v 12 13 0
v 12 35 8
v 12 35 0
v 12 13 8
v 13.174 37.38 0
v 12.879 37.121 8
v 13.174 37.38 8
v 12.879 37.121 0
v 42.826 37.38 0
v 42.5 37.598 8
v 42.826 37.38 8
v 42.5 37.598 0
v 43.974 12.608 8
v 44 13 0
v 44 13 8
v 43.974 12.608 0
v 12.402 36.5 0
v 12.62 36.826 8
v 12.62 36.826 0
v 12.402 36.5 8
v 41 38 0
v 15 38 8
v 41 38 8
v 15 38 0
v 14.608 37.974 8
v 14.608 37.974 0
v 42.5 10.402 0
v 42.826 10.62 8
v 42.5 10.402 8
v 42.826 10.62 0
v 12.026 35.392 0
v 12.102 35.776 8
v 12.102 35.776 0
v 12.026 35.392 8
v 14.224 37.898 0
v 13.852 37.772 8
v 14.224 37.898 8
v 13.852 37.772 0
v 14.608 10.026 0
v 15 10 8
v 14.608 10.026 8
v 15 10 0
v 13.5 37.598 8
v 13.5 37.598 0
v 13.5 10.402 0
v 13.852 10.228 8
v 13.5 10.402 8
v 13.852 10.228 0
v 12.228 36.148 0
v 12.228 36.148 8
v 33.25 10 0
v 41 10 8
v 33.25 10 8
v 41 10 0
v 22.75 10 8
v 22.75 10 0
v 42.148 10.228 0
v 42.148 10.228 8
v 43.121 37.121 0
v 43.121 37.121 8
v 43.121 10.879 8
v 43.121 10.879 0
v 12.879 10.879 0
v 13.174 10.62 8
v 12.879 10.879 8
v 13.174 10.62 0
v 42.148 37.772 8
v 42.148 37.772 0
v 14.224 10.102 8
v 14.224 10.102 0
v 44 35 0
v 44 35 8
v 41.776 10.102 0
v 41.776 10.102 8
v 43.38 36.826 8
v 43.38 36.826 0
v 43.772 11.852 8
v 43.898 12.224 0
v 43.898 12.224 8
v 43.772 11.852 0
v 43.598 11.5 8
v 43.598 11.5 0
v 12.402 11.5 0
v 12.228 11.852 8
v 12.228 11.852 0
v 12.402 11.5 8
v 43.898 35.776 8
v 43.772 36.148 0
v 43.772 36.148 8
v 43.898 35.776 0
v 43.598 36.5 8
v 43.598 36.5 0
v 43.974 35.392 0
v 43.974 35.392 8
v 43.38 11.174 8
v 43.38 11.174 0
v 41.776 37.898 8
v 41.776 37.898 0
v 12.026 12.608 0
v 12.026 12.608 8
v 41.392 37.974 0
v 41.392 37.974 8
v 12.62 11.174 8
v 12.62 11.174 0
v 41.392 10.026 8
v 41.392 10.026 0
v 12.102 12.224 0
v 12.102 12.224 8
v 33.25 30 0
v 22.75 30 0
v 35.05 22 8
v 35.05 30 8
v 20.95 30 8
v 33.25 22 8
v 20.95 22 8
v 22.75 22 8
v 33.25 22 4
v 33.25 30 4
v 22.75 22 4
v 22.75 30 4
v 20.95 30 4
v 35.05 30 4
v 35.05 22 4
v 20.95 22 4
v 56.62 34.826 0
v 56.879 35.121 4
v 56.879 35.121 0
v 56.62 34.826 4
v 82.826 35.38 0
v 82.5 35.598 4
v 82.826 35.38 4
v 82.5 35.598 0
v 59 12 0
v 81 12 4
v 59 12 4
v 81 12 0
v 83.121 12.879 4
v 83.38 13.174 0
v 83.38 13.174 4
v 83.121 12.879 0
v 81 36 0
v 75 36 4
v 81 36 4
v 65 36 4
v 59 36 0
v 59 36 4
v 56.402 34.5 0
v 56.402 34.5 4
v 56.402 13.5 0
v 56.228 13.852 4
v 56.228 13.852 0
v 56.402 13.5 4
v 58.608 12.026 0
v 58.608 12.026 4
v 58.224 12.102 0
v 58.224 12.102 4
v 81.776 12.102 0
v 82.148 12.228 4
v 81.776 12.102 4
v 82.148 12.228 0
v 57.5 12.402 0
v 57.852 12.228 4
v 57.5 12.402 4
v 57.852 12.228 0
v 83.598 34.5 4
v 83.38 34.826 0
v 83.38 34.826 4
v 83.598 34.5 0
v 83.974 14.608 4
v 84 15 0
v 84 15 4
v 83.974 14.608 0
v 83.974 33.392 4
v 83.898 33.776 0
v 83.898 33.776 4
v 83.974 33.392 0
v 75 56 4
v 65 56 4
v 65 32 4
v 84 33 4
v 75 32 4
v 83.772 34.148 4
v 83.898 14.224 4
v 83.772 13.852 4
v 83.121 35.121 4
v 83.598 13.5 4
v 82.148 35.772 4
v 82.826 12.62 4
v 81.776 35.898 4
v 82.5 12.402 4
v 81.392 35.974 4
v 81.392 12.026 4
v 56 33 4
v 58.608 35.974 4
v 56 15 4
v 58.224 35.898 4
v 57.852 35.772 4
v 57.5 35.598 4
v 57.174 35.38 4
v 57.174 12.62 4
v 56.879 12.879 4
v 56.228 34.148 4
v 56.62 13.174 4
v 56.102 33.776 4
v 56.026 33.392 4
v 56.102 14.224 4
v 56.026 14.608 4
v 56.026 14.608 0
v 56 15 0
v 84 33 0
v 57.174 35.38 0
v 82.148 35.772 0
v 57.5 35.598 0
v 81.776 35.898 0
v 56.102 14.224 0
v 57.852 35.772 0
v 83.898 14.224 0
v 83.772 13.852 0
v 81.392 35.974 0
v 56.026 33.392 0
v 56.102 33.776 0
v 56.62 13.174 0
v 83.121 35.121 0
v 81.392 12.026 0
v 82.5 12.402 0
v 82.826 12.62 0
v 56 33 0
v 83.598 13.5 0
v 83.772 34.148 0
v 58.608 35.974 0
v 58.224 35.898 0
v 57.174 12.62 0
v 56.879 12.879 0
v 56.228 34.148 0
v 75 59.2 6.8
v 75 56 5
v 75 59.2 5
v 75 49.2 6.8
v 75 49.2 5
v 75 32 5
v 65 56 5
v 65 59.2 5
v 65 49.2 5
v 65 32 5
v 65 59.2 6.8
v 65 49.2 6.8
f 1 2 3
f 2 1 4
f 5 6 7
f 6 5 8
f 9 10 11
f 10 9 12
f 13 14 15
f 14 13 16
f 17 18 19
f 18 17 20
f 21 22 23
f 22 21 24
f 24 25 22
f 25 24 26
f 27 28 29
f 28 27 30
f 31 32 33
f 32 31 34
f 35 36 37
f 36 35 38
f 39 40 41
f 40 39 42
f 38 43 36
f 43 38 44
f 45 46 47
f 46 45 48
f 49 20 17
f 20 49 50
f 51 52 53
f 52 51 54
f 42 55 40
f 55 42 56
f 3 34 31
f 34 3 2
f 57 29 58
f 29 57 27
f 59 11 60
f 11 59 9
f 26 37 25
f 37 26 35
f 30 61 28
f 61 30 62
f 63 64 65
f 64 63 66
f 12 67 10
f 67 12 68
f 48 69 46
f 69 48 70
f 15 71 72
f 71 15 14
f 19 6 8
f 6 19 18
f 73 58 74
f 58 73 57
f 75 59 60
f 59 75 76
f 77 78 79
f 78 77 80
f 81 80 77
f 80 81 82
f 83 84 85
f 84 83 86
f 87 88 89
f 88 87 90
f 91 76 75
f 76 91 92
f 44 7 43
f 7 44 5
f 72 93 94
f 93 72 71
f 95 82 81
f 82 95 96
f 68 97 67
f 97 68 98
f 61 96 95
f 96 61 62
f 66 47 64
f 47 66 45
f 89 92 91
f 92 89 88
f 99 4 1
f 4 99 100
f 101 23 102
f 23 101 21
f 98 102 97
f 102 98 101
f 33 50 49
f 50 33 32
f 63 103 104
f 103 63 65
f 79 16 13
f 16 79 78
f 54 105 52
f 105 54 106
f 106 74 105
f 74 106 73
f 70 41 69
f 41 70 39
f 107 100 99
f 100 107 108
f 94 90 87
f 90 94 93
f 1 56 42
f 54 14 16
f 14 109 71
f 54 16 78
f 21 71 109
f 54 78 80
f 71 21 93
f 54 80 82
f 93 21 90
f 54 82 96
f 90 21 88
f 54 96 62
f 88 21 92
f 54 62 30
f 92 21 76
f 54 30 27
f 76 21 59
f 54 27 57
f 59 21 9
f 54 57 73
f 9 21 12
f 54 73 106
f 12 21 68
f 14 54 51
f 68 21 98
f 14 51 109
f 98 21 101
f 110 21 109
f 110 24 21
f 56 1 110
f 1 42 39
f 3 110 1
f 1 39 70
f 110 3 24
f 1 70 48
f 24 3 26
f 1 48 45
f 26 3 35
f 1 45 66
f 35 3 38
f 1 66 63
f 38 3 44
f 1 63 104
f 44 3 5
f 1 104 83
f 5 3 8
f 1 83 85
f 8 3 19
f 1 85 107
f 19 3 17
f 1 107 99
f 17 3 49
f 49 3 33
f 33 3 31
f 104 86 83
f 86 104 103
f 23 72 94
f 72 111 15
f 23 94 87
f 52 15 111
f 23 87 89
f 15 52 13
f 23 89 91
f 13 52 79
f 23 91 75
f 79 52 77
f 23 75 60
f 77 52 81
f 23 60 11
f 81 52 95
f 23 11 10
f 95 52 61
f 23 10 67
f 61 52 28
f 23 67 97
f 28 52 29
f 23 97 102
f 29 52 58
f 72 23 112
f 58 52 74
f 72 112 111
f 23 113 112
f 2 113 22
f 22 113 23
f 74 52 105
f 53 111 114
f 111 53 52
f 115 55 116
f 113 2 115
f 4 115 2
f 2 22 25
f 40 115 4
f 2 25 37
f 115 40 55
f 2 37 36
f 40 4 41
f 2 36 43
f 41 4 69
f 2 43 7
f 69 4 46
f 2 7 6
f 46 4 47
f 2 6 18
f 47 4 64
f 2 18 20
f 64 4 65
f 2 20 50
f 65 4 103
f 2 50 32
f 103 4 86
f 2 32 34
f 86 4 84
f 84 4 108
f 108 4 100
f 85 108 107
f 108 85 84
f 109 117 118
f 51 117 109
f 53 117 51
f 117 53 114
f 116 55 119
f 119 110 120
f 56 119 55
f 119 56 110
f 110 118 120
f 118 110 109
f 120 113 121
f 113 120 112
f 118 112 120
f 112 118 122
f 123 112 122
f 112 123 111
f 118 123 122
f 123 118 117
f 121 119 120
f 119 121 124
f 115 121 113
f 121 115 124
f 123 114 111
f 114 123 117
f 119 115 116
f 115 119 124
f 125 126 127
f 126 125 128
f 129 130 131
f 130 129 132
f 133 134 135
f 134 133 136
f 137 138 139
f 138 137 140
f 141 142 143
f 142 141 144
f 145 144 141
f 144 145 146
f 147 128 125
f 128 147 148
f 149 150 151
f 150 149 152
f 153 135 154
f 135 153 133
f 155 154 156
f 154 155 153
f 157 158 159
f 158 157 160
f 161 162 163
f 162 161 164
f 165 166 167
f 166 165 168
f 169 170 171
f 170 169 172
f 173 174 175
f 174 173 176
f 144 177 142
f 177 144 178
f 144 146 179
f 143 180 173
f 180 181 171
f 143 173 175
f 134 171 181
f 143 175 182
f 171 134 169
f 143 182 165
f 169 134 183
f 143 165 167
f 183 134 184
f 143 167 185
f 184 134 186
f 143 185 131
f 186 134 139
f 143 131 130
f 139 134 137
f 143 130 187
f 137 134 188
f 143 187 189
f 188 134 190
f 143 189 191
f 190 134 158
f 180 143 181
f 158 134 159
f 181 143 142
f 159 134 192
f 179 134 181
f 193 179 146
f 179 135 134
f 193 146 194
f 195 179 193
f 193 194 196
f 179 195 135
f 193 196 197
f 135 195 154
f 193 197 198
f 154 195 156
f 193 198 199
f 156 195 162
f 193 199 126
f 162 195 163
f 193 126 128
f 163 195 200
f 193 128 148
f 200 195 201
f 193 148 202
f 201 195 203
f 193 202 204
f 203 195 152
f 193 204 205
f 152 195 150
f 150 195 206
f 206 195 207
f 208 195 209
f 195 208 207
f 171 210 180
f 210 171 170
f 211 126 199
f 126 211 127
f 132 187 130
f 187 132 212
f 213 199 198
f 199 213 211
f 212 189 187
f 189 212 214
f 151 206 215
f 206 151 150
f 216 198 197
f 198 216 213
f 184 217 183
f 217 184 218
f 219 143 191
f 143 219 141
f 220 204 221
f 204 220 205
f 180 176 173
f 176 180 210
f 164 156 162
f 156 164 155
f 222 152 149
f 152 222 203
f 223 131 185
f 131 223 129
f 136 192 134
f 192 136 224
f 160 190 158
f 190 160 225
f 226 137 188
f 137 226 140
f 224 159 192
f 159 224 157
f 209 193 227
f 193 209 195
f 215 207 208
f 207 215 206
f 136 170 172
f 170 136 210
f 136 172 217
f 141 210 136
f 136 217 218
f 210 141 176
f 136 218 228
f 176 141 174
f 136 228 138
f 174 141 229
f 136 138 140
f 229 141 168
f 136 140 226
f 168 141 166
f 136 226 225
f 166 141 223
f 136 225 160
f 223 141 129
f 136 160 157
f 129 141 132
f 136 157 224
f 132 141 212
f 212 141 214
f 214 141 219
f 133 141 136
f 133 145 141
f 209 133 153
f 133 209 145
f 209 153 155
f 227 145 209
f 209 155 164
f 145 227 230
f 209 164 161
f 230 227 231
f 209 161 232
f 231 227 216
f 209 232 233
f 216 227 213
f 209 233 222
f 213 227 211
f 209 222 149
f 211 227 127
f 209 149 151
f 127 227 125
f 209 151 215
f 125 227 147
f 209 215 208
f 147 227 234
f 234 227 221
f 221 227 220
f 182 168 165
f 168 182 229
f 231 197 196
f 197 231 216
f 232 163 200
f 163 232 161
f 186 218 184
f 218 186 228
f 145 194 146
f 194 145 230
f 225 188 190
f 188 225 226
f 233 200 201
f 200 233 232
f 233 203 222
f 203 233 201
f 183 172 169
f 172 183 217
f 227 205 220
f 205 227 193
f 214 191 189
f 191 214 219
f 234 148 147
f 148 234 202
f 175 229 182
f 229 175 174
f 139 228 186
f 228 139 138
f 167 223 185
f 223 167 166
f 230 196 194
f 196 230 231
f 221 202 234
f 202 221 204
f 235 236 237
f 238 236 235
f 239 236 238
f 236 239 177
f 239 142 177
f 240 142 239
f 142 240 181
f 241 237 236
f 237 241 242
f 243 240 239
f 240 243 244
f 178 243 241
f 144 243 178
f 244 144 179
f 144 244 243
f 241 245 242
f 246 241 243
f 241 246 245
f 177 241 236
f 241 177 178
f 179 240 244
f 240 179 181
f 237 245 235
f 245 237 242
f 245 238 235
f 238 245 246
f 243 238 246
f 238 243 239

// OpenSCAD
/*
Sample 070: Wiederlösbarer Kragarm-Schnapper — ausgewogen 1,0 mm
Generated from the FDM Mechanical Sample Library.
Units: millimetres.

Override examples:
  openscad -o custom.stl -D 'view="plate"' -D 'render_fn=64' model.scad
  openscad -o preview.png -D 'view="assembly"' model.scad
*/
use <../../../library/fdm_mechanisms.scad>

render_fn = is_undef(render_fn) ? 48 : render_fn;
view = is_undef(view) ? "plate" : view;
$fn = render_fn;

sample_cantilever_snap(
    view=view,
    beam_t=1,
    clearance=0.25,
    hook=1.8
);
